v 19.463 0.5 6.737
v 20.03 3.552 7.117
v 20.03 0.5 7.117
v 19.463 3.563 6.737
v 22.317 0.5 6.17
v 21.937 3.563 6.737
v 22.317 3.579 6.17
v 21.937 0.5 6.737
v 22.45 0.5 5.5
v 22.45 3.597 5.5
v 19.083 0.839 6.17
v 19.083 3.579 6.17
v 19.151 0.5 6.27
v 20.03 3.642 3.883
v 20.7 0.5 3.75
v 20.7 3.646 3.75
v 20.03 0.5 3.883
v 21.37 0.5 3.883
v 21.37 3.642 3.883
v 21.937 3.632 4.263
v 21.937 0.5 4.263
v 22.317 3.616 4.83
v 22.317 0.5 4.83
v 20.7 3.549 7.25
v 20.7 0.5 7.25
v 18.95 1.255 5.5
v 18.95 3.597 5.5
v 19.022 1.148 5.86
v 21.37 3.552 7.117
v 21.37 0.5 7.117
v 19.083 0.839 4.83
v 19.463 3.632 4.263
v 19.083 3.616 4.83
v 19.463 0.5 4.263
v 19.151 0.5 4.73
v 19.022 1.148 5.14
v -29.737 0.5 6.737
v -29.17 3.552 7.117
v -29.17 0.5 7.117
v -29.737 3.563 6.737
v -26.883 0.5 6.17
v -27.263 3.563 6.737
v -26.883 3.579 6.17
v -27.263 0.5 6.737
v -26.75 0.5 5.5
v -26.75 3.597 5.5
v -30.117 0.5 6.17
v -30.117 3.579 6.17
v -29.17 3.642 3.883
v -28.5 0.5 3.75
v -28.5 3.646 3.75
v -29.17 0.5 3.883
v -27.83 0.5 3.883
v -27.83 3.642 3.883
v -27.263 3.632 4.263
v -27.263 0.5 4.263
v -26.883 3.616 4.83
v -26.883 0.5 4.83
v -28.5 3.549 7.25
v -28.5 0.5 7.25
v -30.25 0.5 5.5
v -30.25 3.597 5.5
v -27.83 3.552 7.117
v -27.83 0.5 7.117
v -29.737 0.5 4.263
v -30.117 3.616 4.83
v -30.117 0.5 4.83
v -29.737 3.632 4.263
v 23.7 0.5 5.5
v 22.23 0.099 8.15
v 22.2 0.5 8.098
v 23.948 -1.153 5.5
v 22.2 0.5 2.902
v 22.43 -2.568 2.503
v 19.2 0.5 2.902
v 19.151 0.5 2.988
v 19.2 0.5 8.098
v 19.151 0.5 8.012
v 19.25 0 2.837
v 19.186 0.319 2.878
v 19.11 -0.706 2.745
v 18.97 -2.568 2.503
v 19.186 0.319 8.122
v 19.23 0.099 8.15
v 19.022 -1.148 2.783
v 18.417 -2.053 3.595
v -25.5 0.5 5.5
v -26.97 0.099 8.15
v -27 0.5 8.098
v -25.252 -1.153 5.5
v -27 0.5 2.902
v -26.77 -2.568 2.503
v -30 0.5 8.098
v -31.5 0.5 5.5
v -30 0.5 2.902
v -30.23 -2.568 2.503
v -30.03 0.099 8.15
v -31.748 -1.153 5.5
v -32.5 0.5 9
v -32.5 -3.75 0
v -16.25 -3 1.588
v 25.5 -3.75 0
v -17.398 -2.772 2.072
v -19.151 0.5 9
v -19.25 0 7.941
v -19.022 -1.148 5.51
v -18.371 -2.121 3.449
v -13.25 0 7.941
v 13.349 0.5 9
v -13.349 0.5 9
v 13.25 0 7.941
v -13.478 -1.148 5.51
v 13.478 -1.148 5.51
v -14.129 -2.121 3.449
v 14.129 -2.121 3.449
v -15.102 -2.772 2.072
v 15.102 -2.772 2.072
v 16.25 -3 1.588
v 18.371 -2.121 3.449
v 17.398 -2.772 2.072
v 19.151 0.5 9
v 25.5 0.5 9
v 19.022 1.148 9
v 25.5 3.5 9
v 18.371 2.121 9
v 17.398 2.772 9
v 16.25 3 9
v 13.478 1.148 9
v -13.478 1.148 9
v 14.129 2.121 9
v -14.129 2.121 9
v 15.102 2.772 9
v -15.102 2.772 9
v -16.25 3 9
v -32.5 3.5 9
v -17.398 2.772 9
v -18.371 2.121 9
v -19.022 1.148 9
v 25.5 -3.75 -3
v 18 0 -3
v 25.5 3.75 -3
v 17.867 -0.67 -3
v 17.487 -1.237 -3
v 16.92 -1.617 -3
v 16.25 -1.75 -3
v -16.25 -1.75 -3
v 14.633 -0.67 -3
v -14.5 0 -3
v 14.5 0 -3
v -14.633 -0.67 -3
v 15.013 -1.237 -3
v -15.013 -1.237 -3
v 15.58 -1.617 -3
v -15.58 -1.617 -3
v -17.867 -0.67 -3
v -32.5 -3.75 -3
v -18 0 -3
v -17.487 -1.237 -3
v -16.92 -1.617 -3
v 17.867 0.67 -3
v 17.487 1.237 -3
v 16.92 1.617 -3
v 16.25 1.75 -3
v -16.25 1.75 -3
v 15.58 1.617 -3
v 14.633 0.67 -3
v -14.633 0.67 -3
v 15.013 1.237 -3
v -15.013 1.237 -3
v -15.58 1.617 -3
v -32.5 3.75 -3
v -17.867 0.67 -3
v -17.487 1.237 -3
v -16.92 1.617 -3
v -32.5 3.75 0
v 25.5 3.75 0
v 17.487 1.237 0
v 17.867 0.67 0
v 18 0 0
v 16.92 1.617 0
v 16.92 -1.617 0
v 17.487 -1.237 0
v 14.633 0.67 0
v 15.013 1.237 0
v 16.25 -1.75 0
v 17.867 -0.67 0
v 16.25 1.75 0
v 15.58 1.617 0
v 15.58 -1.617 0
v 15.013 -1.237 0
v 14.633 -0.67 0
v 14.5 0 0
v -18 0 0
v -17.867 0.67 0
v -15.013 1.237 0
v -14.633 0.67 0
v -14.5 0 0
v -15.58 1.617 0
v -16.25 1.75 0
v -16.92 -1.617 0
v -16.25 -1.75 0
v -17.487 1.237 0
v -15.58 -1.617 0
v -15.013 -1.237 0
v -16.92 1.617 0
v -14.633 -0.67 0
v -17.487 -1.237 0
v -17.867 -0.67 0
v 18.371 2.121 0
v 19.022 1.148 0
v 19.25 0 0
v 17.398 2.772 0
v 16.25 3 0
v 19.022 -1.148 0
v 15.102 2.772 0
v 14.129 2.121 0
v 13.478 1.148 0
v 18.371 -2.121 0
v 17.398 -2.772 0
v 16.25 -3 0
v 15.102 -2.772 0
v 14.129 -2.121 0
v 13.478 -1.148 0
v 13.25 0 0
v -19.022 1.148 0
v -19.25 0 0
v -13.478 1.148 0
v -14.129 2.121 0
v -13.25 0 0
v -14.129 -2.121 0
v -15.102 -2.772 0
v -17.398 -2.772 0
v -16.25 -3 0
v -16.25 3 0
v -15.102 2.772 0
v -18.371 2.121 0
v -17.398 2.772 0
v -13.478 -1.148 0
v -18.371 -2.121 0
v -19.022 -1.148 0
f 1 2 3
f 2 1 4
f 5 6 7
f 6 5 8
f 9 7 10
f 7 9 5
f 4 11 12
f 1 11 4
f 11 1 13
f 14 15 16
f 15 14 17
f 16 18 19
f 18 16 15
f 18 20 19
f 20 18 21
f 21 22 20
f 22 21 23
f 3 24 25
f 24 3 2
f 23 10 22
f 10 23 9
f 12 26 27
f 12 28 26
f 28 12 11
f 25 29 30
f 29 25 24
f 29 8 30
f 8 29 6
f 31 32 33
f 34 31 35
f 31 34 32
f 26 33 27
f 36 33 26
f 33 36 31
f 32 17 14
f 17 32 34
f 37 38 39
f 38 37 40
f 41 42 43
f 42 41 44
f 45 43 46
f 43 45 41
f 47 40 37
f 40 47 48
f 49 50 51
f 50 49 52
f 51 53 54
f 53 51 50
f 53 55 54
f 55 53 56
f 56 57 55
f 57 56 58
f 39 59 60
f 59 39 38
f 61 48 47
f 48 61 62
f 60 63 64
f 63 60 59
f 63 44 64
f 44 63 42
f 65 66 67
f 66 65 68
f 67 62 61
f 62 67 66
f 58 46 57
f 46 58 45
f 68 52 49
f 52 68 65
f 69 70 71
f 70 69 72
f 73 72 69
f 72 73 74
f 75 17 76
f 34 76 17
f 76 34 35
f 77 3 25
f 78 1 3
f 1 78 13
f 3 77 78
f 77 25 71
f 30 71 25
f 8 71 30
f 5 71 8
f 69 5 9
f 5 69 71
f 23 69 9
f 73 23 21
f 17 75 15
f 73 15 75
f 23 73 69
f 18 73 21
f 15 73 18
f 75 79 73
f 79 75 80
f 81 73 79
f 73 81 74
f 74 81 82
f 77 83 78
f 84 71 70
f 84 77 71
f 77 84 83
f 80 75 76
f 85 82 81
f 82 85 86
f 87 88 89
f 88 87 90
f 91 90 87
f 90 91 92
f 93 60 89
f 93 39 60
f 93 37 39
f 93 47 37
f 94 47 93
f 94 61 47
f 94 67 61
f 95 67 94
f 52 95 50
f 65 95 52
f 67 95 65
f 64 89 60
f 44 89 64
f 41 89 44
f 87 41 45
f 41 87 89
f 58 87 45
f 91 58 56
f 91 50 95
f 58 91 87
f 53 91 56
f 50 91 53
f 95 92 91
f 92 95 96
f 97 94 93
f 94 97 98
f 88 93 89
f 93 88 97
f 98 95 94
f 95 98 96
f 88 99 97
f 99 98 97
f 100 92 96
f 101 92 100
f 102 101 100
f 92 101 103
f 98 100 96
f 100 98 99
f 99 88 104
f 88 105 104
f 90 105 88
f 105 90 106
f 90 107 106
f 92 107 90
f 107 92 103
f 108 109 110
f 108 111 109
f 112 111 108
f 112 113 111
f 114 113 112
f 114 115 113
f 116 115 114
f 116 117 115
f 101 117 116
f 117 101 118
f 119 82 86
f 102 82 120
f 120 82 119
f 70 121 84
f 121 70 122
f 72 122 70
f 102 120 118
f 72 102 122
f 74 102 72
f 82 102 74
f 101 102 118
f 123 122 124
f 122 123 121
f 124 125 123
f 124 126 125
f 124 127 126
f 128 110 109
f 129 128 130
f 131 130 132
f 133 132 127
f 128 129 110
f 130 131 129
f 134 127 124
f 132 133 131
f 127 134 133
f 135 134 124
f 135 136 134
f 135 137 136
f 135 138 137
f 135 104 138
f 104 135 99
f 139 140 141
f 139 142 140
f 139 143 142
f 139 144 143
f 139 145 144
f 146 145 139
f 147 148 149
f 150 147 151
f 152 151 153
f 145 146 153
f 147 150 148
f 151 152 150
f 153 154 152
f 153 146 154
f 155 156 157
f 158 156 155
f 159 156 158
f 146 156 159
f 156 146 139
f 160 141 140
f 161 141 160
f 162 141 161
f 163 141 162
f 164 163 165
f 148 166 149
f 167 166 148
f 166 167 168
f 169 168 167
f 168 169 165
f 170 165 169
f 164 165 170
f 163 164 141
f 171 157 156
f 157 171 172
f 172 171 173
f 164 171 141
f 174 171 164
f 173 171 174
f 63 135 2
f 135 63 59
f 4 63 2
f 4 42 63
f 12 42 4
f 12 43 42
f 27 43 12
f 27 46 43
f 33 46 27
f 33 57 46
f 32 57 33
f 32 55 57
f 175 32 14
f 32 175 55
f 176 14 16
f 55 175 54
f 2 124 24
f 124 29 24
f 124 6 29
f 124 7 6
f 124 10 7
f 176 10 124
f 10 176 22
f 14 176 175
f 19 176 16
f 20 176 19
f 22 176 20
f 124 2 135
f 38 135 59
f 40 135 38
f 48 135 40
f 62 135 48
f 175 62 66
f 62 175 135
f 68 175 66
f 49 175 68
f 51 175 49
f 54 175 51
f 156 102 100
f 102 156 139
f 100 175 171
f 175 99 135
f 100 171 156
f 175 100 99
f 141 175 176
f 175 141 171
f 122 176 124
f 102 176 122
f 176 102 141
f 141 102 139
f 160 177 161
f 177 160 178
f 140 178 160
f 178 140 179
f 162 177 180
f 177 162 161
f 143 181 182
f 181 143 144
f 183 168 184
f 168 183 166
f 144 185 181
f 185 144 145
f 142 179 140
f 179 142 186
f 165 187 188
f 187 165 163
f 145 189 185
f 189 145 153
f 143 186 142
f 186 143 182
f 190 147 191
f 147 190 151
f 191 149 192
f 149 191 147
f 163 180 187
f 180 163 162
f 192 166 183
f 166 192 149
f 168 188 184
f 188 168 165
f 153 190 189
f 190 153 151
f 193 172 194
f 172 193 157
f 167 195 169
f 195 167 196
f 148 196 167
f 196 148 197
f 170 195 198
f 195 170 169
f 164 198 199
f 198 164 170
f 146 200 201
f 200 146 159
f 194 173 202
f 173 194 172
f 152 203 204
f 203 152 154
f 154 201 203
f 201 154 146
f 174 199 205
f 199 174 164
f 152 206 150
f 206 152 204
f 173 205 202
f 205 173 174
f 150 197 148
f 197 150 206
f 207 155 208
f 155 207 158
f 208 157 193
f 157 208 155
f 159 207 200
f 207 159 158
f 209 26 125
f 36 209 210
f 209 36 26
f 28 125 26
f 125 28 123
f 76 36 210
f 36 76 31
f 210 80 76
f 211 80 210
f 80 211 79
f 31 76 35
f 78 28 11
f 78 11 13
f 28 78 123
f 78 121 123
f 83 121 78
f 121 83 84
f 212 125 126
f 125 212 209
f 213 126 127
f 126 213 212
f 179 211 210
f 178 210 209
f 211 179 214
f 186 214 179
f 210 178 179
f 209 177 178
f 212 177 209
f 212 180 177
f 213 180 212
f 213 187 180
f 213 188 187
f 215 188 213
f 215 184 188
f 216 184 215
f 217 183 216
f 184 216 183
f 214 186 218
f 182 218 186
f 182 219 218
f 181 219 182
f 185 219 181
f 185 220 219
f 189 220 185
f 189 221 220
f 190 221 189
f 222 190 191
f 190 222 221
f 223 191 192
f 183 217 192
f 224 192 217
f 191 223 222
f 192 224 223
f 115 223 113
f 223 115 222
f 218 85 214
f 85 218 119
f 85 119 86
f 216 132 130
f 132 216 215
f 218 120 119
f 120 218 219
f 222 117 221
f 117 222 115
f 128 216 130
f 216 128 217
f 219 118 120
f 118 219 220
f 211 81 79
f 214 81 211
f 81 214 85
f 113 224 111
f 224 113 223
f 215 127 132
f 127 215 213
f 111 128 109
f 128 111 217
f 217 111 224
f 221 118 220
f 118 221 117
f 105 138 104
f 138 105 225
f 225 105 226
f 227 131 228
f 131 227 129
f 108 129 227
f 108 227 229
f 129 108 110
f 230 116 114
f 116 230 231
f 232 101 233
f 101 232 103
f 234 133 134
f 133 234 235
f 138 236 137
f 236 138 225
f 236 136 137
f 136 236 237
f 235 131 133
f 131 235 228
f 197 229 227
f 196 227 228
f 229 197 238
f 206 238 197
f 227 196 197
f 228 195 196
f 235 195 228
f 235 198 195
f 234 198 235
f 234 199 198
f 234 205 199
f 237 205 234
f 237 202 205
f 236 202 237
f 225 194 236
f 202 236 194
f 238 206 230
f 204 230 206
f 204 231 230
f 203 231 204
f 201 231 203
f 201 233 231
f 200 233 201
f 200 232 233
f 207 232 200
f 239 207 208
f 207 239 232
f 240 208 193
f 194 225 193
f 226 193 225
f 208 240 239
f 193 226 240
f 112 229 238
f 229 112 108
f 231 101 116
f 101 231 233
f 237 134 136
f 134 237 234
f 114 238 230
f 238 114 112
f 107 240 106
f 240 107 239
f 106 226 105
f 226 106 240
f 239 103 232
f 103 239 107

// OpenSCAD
// file: mipi_controller.scad
pcb_thickness = 1.0;

hole_dia_small = 2.05;
hole_dia_large = 2.8;

corner_radius = 4.0;

pcb_large();

translate([60,0,0]) pcb_small();

translate([0,70,34/2]){
    lcd();
    cylinder(d=30, h=2, center=true);
}

module pcb_small(){
    difference(){
        union(){
            color("SteelBlue") cube([42.7, 24.0, pcb_thickness], center=true);
            translate([0,24/2-4.7/2-1.3,pcb_thickness/2]) flex_connector();
            color("DimGray") translate([2.5/2-42.7/2+3.8,12.5/2-24/2+3.8,0.5]) cube([2.5, 12.5, 1.0], center=true);
        }
        translate([(41-hole_dia_small)/2, (22.6-hole_dia_small)/2, 0]) 
            cylinder(d=hole_dia_small, h=pcb_thickness*3, center=true, $fn=16);
        translate([-(41-hole_dia_small)/2, (22.6-hole_dia_small)/2, 0]) 
            cylinder(d=hole_dia_small, h=pcb_thickness*3, center=true, $fn=16);
        translate([(41-hole_dia_small)/2, -(22.6-hole_dia_small)/2, 0]) 
            cylinder(d=hole_dia_small, h=pcb_thickness*3, center=true, $fn=16);
        translate([-(41-hole_dia_small)/2, -(22.6-hole_dia_small)/2, 0]) 
            cylinder(d=hole_dia_small, h=pcb_thickness*3, center=true, $fn=16);
    }
}

module pcb_large(){
    difference(){
        union(){
            color("SteelBlue") hull(){
                translate([(65-corner_radius)/2, (64-corner_radius)/2, 0]) 
                    cylinder(d = corner_radius, h = pcb_thickness, $fn=16, center=true);
                translate([-(65-corner_radius)/2, (64-corner_radius)/2, 0]) 
                    cylinder(d = corner_radius, h = pcb_thickness, $fn=16, center=true);
                translate([(65-corner_radius)/2, -(64-corner_radius)/2, 0]) 
                    cylinder(d = corner_radius, h = pcb_thickness, $fn=16, center=true);
                translate([-(65-corner_radius)/2, -(64-corner_radius)/2, 0]) 
                    cylinder(d = corner_radius, h = pcb_thickness, $fn=16, center=true);
            }
            translate([0,(64-4.7)/2-1.3,pcb_thickness/2]) flex_connector();
            // HDMI:
            translate([0, -(64-11.6)/2-1.3,(6+pcb_thickness)/2]) color("Silver") 
                cube([15,11.6, 6], center=true);
            // USB:
            translate([7.7-(65-8)/2, -(64-6)/2-0.6,(2.5+pcb_thickness)/2]) color("Silver") 
                cube([8, 6, 2.5], center=true);
            
        }
        translate([(55.3+hole_dia_large)/2, 2.1-(64-hole_dia_large)/2, 0])
            #cylinder(d=hole_dia_large, h=pcb_thickness*3, $fn=16, center=true);
        translate([-(55.3+hole_dia_large)/2, 2.1-(64-hole_dia_large)/2, 0])
            cylinder(d=hole_dia_large, h=pcb_thickness*3, $fn=16, center=true);
        
        translate([(55.3+hole_dia_large)/2, hole_dia_large+46.4+2.1-(64-hole_dia_large)/2, 0])
            #cylinder(d=hole_dia_large, h=pcb_thickness*3, $fn=16, center=true);
        translate([-(55.3+hole_dia_large)/2, hole_dia_large+46.4+2.1-(64-hole_dia_large)/2, 0])
            cylinder(d=hole_dia_large, h=pcb_thickness*3, $fn=16, center=true);
    }
}

module flex_connector(){
    color("White") translate([0,0,2.1/2]) cube([35.1, 4.7, 2.1], center=true);
}

module lcd(){
    color("Silver") cube([127.6, 69.85, 0.6], center=true);
}
// main file
use <mipi_controller.scad>

module pcb_bracket_large(){
    difference(){
        union(){
            hull(){
                translate([-3.5,0,-1.5]) cube([58,7.5,3], center=true);
                translate([-3.5,2,5.5]) cube([58,3,7], center=true);
            }
        }
        translate([32.5/2,0,0]) cylinder(d=3.5, h=30, center=true, $fn=16);
        translate([-32.5/2,0,0]) cylinder(d=3.5, h=30, center=true, $fn=16);
        
        translate([32.5/2,0,0]) cylinder(d=6, h=10, $fn=16);
        translate([-32.5/2,0,0]) cylinder(d=6, h=10, $fn=16);
        
        translate([-3.9,2,5.5]){
            translate([49.2/2,0,0]) rotate([90,0,0]) cylinder(d=3.5, h=10, center=true, $fn=16);
            translate([-49.2/2,0,0]) rotate([90,0,0]) cylinder(d=3.5, h=10, center=true, $fn=16);
            
            translate([49.2/2,-4,0]) rotate([90,0,0]) cylinder(d1=6, d2=7.5, h=5, center=true, $fn=6);
            translate([-49.2/2,-4,0]) rotate([90,0,0]) cylinder(d1=6, d2=7.5, h=5, center=true, $fn=6);
        }
        
    }
}

//translate([0,4,32.5+2]) rotate([-90,-90,0]) pcb_large();
pcb_bracket_large();
